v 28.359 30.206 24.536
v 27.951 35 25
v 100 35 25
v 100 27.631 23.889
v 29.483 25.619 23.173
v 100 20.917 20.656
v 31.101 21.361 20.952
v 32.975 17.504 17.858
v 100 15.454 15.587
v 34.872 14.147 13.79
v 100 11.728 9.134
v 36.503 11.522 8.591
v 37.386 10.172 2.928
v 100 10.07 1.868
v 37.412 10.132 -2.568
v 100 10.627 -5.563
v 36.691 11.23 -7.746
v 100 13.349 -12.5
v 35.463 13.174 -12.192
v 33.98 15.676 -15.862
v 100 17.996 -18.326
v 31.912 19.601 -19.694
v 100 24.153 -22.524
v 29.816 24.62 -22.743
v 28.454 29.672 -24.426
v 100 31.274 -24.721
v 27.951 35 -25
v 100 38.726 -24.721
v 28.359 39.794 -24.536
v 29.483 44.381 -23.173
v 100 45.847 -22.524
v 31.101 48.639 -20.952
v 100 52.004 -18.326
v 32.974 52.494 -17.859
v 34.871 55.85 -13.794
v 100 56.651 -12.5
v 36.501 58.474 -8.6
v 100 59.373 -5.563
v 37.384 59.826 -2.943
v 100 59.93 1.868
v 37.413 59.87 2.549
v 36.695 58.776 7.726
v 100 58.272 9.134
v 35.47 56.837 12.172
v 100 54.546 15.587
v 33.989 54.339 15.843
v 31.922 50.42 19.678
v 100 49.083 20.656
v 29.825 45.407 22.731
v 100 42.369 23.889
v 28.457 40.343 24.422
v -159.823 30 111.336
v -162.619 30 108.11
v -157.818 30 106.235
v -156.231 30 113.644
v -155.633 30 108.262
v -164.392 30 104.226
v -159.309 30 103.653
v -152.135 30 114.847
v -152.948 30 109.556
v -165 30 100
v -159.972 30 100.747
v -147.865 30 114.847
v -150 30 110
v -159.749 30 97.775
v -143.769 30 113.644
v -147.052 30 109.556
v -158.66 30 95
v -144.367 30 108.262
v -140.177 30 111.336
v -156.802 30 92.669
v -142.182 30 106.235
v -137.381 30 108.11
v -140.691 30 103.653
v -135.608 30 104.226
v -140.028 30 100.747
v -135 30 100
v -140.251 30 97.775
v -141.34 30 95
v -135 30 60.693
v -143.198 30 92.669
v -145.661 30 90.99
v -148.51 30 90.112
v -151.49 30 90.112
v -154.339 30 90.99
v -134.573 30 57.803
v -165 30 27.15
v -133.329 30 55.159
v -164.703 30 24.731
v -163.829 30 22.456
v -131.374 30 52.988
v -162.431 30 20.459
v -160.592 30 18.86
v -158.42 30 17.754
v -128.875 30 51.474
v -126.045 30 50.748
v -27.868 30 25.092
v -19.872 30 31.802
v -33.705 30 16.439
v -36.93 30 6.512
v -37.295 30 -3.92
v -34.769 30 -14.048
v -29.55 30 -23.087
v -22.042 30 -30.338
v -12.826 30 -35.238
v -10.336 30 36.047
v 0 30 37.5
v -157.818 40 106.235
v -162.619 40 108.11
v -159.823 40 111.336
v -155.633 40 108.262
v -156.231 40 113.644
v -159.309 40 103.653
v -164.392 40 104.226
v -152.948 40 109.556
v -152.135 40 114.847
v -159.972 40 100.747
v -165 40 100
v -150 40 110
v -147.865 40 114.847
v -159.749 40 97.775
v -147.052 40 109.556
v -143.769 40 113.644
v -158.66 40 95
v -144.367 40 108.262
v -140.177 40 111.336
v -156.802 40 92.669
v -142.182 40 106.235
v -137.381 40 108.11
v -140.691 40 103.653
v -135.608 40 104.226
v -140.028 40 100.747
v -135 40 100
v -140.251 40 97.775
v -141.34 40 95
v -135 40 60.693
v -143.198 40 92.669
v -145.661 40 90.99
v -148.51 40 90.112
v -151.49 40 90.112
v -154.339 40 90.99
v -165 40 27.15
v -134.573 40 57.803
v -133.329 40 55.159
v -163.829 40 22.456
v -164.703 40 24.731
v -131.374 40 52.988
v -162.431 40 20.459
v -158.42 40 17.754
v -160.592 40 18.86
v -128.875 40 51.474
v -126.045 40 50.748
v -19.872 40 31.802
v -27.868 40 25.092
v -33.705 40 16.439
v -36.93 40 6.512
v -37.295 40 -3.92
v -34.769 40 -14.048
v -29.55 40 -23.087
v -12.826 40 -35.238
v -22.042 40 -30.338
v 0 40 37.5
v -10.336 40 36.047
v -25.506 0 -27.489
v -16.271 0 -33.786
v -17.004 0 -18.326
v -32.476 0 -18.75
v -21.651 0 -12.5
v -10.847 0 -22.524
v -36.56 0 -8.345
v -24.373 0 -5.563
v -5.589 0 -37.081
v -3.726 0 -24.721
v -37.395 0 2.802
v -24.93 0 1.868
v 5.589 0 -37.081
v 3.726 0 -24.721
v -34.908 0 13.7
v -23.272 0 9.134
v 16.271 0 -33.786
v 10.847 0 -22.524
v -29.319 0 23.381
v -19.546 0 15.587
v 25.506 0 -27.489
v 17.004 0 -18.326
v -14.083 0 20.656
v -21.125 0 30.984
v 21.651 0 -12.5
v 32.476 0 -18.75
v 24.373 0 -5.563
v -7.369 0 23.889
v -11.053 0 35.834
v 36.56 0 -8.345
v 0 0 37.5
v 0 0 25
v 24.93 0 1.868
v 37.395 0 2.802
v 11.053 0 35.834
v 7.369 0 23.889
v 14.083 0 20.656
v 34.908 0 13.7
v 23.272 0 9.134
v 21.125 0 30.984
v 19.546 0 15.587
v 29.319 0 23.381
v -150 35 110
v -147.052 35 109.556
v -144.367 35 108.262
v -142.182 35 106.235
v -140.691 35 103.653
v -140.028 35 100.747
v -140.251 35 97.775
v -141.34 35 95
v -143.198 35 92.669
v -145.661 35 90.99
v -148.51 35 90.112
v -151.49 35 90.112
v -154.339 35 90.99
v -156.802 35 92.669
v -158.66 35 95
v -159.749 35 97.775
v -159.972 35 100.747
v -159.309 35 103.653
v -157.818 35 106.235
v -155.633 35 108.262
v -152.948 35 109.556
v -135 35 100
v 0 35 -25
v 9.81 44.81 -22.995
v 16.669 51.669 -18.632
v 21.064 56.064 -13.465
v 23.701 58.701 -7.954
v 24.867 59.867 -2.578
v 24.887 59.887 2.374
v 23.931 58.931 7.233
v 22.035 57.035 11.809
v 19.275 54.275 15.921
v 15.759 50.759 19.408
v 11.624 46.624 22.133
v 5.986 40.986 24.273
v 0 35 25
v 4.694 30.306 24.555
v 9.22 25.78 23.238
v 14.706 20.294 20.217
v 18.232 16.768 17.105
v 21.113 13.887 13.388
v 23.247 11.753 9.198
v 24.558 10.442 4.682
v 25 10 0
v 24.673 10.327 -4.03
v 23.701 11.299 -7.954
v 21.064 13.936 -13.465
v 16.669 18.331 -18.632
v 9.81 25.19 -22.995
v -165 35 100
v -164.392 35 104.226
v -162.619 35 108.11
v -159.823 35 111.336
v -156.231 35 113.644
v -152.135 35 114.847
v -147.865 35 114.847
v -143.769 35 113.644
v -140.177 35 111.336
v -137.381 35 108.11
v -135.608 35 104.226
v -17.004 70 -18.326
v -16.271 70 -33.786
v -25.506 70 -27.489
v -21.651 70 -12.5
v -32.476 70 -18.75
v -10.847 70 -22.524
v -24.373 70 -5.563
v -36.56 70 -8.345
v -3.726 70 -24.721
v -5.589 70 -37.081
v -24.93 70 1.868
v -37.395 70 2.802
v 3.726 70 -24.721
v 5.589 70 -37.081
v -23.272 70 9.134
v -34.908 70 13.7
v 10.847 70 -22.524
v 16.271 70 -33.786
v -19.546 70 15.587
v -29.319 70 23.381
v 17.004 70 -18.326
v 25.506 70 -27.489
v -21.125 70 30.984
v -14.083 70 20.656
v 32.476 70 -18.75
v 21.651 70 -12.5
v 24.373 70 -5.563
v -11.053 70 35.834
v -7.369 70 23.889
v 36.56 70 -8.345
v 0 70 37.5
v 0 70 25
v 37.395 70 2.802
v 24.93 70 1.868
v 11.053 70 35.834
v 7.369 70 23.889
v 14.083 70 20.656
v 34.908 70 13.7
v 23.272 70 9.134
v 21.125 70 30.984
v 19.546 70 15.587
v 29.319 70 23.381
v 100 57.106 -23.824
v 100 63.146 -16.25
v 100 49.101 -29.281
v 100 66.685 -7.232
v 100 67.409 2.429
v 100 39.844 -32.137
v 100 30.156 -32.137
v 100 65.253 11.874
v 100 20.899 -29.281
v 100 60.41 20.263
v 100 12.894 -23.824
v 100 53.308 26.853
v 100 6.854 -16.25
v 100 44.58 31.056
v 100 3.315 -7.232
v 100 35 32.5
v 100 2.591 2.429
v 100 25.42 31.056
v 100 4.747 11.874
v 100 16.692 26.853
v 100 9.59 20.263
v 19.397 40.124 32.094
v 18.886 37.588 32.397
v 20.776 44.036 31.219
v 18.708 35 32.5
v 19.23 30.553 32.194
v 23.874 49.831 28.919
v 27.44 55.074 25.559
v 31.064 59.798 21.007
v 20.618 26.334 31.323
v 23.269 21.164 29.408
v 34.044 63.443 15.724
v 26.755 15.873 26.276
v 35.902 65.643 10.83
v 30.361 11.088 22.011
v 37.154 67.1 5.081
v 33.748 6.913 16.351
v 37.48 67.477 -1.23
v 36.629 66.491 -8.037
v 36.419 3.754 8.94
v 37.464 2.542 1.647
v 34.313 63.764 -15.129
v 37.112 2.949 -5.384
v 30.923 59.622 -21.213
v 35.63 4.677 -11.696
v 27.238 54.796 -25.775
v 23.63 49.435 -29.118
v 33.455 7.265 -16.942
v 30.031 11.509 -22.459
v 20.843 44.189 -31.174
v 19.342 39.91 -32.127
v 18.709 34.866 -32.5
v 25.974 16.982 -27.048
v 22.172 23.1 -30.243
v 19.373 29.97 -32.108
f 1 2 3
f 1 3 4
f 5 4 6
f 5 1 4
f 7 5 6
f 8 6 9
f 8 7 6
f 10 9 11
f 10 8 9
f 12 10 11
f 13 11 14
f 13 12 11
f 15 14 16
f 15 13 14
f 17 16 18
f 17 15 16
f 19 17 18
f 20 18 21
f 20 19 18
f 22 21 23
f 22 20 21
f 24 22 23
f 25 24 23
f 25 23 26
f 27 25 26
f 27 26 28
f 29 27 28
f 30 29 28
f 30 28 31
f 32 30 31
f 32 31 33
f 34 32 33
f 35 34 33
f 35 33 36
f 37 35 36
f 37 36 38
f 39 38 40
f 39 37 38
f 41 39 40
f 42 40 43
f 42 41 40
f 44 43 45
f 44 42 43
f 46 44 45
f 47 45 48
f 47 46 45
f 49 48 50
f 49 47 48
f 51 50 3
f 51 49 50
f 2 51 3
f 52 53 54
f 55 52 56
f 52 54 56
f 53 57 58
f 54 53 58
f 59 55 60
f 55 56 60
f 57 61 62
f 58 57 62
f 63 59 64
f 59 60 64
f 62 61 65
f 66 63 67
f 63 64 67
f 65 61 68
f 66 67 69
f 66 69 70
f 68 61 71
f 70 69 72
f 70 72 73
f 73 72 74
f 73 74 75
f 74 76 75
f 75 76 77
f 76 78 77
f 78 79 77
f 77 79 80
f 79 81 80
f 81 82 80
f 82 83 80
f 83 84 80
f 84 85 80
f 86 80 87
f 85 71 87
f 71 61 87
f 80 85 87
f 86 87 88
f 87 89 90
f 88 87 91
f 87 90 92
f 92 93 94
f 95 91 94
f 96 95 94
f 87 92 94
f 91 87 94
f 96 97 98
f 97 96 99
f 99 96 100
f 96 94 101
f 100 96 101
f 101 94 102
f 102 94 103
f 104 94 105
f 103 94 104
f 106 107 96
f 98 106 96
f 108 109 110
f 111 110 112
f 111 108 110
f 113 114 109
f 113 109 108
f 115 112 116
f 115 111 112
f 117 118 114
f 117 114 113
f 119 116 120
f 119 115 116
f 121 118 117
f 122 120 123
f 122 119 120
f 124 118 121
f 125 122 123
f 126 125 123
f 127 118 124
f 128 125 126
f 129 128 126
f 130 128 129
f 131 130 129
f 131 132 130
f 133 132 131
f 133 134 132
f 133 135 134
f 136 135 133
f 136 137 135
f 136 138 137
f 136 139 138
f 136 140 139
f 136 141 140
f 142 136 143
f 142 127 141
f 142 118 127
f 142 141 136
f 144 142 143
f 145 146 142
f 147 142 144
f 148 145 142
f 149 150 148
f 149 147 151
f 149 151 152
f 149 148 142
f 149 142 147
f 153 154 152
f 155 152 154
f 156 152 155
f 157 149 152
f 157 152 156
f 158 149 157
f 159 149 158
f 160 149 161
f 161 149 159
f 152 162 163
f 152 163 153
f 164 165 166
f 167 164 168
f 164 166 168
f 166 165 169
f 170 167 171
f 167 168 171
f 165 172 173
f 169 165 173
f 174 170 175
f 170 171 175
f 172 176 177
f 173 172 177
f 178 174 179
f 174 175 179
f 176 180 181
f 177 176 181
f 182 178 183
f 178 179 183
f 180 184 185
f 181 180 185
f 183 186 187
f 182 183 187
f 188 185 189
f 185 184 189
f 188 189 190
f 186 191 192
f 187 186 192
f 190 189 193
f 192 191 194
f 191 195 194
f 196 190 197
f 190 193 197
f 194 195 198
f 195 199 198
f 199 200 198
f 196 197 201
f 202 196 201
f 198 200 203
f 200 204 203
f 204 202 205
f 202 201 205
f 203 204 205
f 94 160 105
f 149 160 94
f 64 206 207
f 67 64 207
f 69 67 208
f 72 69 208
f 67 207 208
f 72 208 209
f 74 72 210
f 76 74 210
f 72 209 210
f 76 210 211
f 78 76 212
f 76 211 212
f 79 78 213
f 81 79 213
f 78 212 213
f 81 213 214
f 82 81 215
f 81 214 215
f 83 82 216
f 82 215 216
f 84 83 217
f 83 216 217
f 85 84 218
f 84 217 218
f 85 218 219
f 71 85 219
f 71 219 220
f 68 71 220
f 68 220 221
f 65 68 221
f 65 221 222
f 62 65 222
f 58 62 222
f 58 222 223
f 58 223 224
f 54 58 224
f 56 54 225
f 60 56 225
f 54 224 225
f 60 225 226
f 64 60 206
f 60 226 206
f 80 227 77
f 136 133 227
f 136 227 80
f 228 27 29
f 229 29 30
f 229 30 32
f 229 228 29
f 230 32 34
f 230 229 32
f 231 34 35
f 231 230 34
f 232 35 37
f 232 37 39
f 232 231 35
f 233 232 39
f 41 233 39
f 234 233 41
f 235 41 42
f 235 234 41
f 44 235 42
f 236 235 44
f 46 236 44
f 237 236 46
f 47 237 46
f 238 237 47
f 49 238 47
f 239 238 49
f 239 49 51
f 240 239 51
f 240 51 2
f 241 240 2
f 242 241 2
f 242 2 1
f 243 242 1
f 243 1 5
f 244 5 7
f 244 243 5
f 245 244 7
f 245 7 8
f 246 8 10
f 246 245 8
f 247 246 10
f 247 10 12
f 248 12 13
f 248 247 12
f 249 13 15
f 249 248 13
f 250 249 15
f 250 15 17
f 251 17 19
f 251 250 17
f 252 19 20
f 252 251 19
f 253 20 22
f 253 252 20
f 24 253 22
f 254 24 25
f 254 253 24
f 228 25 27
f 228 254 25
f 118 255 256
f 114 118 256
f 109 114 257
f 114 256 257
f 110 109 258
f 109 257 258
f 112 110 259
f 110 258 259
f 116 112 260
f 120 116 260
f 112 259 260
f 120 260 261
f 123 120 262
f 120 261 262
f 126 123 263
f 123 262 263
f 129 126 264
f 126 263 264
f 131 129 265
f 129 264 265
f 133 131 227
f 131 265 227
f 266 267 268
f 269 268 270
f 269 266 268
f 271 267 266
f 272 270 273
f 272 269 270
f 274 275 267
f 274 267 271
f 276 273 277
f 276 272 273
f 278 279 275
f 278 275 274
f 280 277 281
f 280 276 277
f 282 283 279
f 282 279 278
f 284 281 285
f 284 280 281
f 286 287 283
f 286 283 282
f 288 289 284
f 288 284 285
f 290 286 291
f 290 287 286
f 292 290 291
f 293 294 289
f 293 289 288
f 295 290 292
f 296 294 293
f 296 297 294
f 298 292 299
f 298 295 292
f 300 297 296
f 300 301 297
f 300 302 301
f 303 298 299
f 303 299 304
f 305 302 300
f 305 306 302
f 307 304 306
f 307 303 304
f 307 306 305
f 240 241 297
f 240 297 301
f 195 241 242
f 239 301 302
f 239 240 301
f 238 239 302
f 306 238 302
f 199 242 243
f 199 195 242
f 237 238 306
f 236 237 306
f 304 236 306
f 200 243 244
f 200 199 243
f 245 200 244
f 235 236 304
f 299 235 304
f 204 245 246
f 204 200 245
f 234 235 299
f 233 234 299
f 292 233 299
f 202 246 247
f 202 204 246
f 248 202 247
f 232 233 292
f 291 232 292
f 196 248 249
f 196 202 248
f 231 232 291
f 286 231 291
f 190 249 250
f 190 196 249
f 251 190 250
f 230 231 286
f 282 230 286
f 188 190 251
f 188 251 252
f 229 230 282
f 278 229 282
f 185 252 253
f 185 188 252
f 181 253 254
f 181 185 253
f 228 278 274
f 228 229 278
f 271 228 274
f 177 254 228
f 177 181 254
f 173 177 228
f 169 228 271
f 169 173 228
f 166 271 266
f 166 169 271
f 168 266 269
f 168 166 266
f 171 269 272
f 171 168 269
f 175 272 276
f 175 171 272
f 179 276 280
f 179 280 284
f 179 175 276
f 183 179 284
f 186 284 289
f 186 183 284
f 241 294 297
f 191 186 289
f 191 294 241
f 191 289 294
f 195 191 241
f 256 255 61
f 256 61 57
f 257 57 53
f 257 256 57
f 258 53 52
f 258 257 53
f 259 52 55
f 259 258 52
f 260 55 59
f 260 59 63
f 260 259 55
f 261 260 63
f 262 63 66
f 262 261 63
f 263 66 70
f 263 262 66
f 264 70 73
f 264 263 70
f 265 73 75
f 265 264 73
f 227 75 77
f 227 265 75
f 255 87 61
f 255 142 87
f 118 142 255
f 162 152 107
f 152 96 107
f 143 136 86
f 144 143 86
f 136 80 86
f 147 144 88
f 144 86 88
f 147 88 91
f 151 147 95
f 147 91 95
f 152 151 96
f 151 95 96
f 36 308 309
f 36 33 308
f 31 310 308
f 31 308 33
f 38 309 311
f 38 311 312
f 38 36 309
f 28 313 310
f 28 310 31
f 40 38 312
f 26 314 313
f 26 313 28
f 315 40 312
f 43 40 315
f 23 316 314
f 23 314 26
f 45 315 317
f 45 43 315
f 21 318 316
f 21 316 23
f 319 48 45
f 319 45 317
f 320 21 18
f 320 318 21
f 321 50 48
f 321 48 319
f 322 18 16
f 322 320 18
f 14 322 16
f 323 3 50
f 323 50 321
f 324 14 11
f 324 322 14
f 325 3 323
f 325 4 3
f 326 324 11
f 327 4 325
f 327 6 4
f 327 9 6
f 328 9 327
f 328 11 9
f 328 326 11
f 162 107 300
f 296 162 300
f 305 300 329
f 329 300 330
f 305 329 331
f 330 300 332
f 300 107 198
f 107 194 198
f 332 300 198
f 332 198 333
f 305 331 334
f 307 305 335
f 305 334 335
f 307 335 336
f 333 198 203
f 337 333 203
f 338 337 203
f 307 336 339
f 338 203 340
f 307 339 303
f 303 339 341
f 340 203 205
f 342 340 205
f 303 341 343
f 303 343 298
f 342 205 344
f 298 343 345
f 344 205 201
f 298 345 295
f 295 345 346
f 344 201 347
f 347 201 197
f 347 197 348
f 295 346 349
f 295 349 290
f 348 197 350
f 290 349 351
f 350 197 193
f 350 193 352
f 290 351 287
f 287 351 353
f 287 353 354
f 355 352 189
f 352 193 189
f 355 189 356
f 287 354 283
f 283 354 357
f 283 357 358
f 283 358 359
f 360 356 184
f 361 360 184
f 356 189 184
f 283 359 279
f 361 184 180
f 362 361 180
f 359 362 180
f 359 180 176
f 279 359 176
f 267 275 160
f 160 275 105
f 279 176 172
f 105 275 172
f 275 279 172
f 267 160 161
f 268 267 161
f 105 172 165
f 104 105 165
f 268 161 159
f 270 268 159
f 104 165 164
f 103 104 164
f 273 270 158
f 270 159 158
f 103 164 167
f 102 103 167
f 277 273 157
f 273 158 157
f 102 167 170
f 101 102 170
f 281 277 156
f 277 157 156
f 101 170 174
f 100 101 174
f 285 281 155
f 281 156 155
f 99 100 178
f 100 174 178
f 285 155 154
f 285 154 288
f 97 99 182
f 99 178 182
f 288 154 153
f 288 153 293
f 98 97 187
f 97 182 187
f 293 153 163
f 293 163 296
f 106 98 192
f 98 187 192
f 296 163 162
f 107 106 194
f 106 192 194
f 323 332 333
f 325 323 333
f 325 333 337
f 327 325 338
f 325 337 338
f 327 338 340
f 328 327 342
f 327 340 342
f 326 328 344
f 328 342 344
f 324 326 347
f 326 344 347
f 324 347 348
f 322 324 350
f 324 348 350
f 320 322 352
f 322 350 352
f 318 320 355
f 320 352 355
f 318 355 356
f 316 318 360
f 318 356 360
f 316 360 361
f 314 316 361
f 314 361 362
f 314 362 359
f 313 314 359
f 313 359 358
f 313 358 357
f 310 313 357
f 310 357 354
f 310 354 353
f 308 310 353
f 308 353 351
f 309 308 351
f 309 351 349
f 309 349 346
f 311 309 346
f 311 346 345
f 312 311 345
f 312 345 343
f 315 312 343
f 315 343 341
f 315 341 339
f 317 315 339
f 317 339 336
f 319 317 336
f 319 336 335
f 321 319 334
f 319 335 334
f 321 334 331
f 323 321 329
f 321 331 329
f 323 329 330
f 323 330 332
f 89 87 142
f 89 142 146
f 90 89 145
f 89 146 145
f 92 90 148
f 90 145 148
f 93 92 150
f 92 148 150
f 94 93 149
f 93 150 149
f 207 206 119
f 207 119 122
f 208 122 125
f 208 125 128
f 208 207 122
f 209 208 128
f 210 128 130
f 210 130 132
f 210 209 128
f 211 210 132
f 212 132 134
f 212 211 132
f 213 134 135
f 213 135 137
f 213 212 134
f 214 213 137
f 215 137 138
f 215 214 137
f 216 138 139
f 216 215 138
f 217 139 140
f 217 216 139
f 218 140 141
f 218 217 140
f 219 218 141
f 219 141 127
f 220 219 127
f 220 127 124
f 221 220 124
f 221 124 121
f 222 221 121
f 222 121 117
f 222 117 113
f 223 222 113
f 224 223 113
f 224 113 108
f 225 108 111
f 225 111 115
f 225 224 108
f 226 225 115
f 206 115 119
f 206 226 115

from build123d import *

# Parameters (mm, degrees)
SKETCH_1_R          = 37.5
SKETCH_1_R_2        = 25
EXTRUDE_1_DEPTH     = 70
SKETCH_2_R          = 32.5
SKETCH_2_R_2        = 25
EXTRUDE_2_DEPTH     = 100
CUT_EXTRUDE_START   = -100
SKETCH_3_R          = 25
CUT_EXTRUDE_1_DEPTH = 100
SKETCH_4_R          = 25
CUT_EXTRUDE_2_DEPTH = 100
EXTRUDE_START       = 35
SKETCH_5_R          = 15
SKETCH_5_R_2        = 10
EXTRUDE_3_DEPTH     = 5
FILLET_2_R          = 10


with BuildPart() as part:
    # 草圖1 → 填料-伸長1 (new body)
    with BuildSketch(Plane(origin=(0, 0, 0), x_dir=(1, 0, 0), z_dir=(0, 1, 0))):
        with Locations(Location((0, 0, 0), (0, 0, 270))):
            Circle(SKETCH_1_R)
        with Locations(Location((0, 0, 0), (0, 0, 270))):
            Circle(SKETCH_1_R_2, mode=Mode.SUBTRACT)
    extrude(amount=EXTRUDE_1_DEPTH)

    # 草圖2 → 填料-伸長2 (add)
    with BuildSketch(Plane(origin=(0, 0, 0), x_dir=(0, 0, -1), z_dir=(1, 0, 0))):
        with Locations(Location((0, 35, 0), (0, 0, 180))):
            Circle(SKETCH_2_R)
        with Locations(Location((0, 35, 0), (0, 0, 180))):
            Circle(SKETCH_2_R_2, mode=Mode.SUBTRACT)
    extrude(amount=EXTRUDE_2_DEPTH)

    # 草圖3 → 除料-伸長1 (cut)
    with BuildSketch(Plane(origin=(0, 70, 0), x_dir=(1, 0, 0), z_dir=(0, 1, 0)).offset(CUT_EXTRUDE_START)):
        with Locations(Location((0, 0, 0), (0, 0, 270))):
            Circle(SKETCH_3_R)
    extrude(amount=CUT_EXTRUDE_1_DEPTH, mode=Mode.SUBTRACT)

    # 草圖4 → 除料-伸長2 (cut)
    with BuildSketch(Plane(origin=(100, 0, 0), x_dir=(0, 0, -1), z_dir=(1, 0, 0)).offset(CUT_EXTRUDE_START)):
        with Locations((0, 35)):
            Circle(SKETCH_4_R)
    extrude(amount=CUT_EXTRUDE_2_DEPTH, mode=Mode.SUBTRACT)

    # 草圖5 → 填料-伸長3 (add, symmetric)
    # profile 1 of 2: a face of its own
    with BuildSketch(Plane(origin=(0, 0, 0), x_dir=(1, 0, 0), z_dir=(0, 1, 0)).offset(EXTRUDE_START)):
        with BuildLine():
            ThreePointArc((0, -37.5), (-36.930290738, -6.511806663), (-12.825755375, 35.238473279))
            Line((-12.825755375, 35.238473279), (-165, -20.148422186))
            Line((-165, -20.148422186), (-165, -100))
            ThreePointArc((-165, -100), (-150, -85), (-135, -100))
            Line((-135, -100), (-135, -51.689071761))
            Line((-135, -51.689071761), (0, -37.5))
        make_face()
    # profile 2 of 2: a face of its own
    with BuildSketch(Plane(origin=(0, 0, 0), x_dir=(1, 0, 0), z_dir=(0, 1, 0)).offset(EXTRUDE_START)):
        with Locations((-150, -100)):
            Circle(SKETCH_5_R)
        with Locations(Location((-150, -100, 0), (0, 0, 270))):
            Circle(SKETCH_5_R_2, mode=Mode.SUBTRACT)
    extrude(amount=EXTRUDE_3_DEPTH, both=True)

    # 圓角2
    fillet_2_edges = [part.edges().sort_by_distance(p)[0] for p in [
        (-165, 35, 20.148422186),
        (-135, 35, 51.689071761),
    ]]
    fillet(fillet_2_edges, radius=FILLET_2_R)


solid = part.part
